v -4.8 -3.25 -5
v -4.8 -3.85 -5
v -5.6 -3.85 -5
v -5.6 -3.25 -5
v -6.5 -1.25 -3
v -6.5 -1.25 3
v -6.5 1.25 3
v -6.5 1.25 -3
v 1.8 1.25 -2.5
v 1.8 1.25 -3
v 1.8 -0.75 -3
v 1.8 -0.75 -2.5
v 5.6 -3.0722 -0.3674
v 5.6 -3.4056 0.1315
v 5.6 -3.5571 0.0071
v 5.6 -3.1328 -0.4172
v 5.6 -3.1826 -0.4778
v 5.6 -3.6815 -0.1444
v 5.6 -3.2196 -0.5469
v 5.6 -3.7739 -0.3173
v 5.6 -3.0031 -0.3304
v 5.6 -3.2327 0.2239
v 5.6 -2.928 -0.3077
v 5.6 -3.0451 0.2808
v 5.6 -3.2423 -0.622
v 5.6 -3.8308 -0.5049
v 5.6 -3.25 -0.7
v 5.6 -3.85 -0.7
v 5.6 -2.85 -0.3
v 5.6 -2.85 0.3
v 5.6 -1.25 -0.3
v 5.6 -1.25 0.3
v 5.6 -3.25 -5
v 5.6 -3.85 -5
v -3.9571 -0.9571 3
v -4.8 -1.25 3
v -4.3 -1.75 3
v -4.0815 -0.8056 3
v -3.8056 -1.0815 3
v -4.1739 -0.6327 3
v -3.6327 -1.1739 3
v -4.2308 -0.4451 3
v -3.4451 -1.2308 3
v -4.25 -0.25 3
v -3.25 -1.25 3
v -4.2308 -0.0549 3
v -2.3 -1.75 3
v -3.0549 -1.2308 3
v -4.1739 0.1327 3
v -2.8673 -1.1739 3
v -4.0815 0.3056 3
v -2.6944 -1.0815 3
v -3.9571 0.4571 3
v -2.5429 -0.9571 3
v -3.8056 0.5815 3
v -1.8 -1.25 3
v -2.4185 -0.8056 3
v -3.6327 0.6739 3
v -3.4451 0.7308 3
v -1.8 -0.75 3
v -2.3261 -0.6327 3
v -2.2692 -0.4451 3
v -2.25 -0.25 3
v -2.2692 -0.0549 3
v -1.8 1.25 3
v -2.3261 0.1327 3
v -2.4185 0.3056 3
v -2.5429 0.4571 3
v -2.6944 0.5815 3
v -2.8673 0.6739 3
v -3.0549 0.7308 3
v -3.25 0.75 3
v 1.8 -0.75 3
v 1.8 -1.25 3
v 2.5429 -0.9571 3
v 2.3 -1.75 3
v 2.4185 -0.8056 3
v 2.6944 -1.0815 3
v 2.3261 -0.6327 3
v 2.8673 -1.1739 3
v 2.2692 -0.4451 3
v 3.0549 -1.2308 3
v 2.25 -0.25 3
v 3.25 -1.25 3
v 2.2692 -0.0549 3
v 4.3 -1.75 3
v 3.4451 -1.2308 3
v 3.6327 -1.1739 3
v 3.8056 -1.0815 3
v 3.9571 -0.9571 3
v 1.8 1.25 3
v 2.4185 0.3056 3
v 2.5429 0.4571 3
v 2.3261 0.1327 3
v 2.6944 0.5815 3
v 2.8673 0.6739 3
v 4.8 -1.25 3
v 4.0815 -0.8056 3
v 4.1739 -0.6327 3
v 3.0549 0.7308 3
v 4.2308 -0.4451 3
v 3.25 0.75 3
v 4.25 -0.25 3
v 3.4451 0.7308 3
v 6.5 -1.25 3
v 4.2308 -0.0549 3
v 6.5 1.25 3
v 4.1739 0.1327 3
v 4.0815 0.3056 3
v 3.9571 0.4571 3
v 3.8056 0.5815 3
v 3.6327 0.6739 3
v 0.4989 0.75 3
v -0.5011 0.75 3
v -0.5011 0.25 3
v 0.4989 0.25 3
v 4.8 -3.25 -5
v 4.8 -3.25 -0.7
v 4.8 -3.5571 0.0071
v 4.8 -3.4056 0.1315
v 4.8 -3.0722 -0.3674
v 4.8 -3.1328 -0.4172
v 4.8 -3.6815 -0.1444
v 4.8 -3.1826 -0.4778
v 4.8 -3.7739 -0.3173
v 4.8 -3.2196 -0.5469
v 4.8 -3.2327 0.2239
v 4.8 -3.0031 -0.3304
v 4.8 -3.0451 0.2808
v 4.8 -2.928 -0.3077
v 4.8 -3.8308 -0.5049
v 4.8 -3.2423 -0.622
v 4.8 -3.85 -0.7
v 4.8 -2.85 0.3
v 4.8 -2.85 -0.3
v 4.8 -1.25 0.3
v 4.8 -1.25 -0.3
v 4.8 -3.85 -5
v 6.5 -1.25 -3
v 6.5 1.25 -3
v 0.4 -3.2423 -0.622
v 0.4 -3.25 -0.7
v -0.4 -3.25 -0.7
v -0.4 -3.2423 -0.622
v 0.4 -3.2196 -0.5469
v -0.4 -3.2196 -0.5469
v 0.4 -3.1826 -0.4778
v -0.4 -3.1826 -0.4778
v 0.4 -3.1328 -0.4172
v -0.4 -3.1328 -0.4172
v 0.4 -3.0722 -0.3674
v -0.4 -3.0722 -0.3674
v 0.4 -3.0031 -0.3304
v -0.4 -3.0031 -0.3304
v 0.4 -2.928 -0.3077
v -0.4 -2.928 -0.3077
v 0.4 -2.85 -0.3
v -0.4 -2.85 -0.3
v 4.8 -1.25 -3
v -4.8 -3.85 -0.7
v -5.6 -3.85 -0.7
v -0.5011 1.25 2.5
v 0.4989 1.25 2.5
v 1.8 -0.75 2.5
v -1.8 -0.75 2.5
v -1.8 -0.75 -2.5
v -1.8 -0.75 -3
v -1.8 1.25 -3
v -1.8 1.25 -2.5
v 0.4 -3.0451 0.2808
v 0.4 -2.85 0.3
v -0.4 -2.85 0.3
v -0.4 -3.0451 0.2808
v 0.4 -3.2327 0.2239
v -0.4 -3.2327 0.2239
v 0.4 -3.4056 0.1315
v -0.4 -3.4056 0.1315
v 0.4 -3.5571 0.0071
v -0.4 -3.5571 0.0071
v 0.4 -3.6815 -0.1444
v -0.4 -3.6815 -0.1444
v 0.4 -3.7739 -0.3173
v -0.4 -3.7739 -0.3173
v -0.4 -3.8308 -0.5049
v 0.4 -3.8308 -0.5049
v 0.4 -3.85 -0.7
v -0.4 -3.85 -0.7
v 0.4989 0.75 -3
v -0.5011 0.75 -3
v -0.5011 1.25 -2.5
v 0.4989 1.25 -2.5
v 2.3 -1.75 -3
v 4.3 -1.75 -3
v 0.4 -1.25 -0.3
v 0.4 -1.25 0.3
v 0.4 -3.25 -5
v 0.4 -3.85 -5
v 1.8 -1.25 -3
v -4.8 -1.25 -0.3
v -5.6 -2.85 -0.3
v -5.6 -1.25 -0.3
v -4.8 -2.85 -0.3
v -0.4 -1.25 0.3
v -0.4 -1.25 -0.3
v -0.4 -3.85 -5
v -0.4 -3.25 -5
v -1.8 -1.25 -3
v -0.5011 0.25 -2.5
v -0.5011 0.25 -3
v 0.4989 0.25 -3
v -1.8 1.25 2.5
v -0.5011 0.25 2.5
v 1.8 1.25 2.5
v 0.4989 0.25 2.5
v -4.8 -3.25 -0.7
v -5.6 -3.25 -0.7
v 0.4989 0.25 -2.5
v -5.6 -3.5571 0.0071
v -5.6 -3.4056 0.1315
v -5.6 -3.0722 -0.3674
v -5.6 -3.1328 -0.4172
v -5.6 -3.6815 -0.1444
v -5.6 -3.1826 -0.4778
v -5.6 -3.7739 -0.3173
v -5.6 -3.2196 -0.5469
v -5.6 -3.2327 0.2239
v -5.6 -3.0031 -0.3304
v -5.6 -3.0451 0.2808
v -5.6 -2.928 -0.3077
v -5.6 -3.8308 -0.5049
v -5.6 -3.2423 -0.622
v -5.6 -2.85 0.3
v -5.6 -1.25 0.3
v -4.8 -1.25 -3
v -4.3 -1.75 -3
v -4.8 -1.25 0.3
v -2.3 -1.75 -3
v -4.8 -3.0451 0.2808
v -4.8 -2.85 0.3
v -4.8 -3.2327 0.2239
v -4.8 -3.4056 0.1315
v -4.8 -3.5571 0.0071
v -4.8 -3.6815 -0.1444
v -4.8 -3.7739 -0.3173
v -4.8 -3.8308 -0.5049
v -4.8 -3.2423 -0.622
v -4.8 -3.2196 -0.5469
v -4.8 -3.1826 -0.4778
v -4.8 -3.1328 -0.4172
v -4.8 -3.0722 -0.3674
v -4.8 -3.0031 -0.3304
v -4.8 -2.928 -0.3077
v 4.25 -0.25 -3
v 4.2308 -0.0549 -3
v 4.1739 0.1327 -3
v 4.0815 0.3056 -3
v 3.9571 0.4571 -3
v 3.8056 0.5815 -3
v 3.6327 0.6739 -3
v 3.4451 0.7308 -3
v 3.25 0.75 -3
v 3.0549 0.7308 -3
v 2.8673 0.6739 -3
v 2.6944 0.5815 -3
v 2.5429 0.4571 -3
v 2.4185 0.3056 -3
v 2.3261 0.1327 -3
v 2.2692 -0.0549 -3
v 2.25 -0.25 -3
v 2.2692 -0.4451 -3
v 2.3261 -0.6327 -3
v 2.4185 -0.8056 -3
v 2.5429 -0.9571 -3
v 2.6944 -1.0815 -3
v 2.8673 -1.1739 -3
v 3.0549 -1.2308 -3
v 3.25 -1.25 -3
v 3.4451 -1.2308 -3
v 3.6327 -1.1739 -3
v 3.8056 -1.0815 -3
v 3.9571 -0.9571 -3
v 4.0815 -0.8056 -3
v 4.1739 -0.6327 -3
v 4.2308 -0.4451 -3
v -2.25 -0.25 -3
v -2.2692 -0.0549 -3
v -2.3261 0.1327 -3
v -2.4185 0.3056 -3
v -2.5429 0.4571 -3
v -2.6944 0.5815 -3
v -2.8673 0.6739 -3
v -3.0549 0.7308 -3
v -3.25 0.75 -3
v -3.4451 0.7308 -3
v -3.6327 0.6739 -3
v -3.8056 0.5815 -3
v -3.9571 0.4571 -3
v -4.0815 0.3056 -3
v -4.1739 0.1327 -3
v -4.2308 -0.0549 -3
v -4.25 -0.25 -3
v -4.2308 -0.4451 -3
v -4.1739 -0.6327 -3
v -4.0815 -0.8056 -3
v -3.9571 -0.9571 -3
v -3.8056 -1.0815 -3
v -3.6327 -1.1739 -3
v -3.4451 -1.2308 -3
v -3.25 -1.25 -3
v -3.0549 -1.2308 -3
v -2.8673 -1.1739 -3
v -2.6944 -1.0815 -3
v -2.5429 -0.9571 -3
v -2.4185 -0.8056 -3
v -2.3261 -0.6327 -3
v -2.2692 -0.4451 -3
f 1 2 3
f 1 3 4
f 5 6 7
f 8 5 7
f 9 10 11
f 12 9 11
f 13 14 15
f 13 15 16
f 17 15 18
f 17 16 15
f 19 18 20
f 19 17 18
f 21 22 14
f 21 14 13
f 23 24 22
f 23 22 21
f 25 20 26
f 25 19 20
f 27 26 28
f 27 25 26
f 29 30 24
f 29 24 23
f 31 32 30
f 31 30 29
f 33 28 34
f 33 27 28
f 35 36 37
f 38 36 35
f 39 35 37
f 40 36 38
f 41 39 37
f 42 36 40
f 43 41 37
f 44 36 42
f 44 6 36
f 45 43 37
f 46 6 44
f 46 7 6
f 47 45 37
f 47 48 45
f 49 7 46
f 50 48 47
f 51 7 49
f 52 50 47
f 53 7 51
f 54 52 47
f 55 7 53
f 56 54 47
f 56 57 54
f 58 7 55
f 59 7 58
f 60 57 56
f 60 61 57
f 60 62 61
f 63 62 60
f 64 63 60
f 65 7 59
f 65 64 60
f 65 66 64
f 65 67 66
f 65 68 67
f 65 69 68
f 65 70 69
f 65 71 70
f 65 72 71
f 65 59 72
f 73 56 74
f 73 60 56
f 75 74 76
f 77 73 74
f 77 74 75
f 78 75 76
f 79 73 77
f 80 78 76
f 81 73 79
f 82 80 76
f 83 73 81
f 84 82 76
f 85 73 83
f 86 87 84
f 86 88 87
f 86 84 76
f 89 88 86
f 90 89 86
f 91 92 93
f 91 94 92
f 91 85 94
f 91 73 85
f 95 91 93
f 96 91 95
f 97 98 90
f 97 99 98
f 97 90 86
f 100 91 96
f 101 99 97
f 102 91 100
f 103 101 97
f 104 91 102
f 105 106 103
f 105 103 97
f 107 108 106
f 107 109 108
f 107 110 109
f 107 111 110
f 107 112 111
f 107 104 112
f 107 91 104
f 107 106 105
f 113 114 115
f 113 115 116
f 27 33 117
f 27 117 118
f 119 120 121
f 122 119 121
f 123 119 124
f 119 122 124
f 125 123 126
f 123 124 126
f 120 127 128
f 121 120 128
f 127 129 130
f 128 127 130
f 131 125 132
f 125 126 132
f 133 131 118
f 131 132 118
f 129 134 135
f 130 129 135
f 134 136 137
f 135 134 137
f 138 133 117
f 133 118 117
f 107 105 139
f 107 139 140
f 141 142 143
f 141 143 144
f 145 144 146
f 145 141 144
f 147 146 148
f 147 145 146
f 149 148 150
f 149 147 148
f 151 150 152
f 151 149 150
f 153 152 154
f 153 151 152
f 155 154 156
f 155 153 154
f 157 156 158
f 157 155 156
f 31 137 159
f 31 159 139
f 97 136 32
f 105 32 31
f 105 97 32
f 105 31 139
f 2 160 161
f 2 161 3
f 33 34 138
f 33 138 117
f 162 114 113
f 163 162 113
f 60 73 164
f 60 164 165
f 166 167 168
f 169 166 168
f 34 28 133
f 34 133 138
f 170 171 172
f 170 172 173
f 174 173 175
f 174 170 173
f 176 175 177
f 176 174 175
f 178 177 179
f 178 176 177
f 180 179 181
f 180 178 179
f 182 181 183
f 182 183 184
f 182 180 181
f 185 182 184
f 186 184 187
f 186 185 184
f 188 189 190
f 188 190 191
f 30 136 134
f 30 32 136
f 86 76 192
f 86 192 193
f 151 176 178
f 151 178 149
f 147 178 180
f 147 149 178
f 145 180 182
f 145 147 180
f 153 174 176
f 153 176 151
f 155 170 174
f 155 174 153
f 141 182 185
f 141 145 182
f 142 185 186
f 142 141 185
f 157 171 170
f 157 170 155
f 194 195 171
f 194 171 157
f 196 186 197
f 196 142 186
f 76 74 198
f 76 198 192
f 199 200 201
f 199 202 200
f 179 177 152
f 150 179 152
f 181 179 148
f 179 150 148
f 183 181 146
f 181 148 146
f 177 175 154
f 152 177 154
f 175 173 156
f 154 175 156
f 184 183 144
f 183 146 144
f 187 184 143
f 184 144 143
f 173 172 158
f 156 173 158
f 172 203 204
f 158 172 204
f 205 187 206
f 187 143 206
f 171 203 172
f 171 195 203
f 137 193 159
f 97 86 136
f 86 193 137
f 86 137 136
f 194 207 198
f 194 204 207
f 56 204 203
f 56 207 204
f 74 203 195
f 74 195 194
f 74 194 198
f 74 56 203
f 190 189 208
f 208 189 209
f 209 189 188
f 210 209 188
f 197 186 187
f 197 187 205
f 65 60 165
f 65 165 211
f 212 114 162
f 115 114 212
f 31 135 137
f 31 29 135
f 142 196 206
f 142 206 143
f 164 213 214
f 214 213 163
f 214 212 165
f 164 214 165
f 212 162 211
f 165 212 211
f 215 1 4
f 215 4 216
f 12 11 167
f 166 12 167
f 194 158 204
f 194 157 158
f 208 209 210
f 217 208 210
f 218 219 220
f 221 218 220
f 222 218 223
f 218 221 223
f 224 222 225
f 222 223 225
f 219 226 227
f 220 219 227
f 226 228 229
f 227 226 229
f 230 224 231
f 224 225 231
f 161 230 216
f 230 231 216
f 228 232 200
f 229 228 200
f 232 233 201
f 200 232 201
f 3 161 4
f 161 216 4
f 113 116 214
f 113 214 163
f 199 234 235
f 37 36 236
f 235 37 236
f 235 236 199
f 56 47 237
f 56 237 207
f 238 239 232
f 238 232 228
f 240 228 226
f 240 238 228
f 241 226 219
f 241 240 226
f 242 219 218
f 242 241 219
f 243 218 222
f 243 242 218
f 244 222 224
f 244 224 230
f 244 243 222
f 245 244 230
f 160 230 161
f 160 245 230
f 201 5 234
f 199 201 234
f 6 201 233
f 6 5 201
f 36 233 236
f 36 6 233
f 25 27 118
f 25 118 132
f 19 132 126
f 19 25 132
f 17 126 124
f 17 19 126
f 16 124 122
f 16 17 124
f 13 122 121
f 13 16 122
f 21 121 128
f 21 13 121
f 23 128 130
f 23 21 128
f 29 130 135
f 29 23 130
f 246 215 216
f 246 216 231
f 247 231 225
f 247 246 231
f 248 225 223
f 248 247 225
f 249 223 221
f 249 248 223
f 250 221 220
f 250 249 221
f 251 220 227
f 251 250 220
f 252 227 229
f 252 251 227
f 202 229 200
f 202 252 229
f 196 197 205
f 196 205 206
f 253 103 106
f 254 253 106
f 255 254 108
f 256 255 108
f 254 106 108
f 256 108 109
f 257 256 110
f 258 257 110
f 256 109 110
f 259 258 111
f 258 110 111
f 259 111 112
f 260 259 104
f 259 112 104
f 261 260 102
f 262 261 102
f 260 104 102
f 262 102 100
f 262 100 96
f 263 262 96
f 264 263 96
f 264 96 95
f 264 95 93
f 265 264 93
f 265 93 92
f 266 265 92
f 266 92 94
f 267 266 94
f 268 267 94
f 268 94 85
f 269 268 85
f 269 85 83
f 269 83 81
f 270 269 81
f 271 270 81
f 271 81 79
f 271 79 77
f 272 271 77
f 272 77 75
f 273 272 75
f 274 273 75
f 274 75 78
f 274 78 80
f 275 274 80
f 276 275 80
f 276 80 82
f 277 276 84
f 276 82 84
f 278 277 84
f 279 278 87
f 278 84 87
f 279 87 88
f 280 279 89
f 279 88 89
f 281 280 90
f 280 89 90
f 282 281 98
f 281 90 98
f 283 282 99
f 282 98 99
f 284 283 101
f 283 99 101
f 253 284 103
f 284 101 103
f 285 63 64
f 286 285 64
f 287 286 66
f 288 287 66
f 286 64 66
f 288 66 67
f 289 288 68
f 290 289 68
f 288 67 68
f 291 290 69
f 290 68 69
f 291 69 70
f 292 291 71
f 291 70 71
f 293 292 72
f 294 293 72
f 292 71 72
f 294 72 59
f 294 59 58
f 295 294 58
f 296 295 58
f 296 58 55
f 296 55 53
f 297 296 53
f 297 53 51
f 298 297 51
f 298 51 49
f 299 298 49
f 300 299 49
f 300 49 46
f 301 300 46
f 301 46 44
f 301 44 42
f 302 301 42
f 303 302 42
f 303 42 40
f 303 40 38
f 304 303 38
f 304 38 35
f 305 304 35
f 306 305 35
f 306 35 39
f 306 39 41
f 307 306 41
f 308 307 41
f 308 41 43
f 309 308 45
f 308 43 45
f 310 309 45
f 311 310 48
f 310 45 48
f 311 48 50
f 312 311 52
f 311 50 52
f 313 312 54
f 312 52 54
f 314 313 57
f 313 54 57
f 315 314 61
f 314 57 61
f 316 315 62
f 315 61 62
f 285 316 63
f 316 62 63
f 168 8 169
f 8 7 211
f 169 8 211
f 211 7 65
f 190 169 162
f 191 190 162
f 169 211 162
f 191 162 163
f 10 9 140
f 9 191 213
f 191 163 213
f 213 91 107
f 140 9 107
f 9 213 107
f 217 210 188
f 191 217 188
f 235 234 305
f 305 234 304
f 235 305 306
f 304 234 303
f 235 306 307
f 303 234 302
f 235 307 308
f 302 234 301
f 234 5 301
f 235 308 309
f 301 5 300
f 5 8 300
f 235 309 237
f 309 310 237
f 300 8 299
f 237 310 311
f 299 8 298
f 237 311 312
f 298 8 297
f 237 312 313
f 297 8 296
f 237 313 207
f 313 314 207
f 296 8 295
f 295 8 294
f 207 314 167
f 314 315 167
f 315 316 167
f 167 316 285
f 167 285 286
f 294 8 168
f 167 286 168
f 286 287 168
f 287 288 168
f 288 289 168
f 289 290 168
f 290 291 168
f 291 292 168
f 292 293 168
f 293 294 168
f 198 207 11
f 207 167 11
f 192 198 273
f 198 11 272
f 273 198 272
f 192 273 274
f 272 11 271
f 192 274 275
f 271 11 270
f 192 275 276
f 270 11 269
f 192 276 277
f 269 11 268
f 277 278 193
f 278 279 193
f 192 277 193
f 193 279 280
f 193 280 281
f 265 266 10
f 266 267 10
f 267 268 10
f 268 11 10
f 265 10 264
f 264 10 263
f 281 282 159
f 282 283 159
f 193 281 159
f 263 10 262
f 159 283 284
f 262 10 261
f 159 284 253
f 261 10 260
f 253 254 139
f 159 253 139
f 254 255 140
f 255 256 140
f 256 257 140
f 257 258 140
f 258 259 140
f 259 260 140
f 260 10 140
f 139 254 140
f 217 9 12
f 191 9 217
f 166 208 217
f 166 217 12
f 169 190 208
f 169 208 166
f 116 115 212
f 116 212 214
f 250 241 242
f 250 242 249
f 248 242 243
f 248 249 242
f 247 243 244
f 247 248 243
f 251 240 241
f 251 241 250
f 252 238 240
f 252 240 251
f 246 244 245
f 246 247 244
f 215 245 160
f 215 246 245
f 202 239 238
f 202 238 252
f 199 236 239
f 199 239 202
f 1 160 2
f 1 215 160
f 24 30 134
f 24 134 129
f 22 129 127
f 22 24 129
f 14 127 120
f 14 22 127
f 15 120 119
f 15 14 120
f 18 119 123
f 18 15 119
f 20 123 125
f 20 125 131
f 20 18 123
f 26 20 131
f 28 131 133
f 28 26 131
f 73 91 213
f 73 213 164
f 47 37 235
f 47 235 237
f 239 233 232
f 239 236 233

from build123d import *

# Parameters (mm, degrees)
SCHIZZO1_W                   = 13
SCHIZZO1_H                   = 2.5
ESTRUSIONE_ESTRUSIONE1_DEPTH = 3
ESTRUSIONE_ESTRUSIONE2_DEPTH = 6
SCHIZZO3_R                   = 1
TAGLIO_ESTRUSIONE1_DEPTH     = 7
TAGLIO_ESTRUSIONE2_DEPTH     = 0.5
SMUSSO1_SIZE                 = 0.5
ESTRUSIONE_ESTRUSIONE3_DEPTH = 0.4
RIPETIZIONE_A_L1_COUNT       = 2
RIPETIZIONE_A_L1_PITCH       = 5.2
RIPETIZIONE_A_L1_COL_COUNT   = 2
RIPETIZIONE_A_L1_COL_PITCH   = 5.2


with BuildPart() as part:
    # Schizzo1 → Estrusione-Estrusione1 (new body, symmetric)
    with BuildSketch(Plane.XY):
        Rectangle(SCHIZZO1_W, SCHIZZO1_H)
    extrude(amount=ESTRUSIONE_ESTRUSIONE1_DEPTH, both=True)

    # Schizzo2 → Estrusione-Estrusione2 (add)
    with BuildSketch(Plane.XY.offset(3)):
        Polygon((-4.8, -1.25), (-4.3, -1.75), (-2.3, -1.75), (-1.8, -1.25), (1.8, -1.25), (2.3, -1.75), (4.3, -1.75), (4.8, -1.25), (4.8, -0.938044121), (-4.8, -0.938044121), align=None)
    extrude(amount=-ESTRUSIONE_ESTRUSIONE2_DEPTH)

    # Schizzo3 → Taglio-Estrusione1 (cut, through all)
    with BuildSketch(Plane.XY.offset(3)):
        with Locations((-3.25, -0.25)):
            Circle(SCHIZZO3_R)
        with Locations((3.25, -0.25)):
            Circle(SCHIZZO3_R)
    extrude(amount=-TAGLIO_ESTRUSIONE1_DEPTH, mode=Mode.SUBTRACT)

    # Schizzo4 → Taglio-Estrusione2 (cut)
    with BuildSketch(Plane.XY.offset(3)):
        Polygon((-1.8, 1.25), (-0.501117074, 1.25), (-0.501117074, 0.25), (0.498882926, 0.25), (0.498882926, 1.25), (1.8, 1.25), (1.8, -0.75), (-1.8, -0.75), align=None)
    taglio_estrusione2 = extrude(amount=-TAGLIO_ESTRUSIONE2_DEPTH, mode=Mode.SUBTRACT)

    # Specchia2: Taglio-Estrusione2 across plane
    add(taglio_estrusione2.mirror(Plane.XY), mode=Mode.SUBTRACT)

    # Smusso1
    smusso1_edges = [part.edges().sort_by_distance(p)[0] for p in [
        (-0.001117074, 1.25, 3),
        (-0.001117074, 1.25, -3),
    ]]
    chamfer(smusso1_edges, length=SMUSSO1_SIZE)

    # Schizzo5 → Estrusione-Estrusione3 (add, symmetric)
    with BuildSketch(Plane(origin=(0, 0, 0), x_dir=(0, 0, -1), z_dir=(1, 0, 0))):
        with BuildLine():
            Line((-0.3, -1.25), (-0.3, -2.85))
            ThreePointArc((-0.3, -2.85), (-0.007106781, -3.557106781), (0.7, -3.85))
            Line((0.7, -3.85), (5, -3.85))
            Line((5, -3.85), (5, -3.25))
            Line((5, -3.25), (0.7, -3.25))
            ThreePointArc((0.7, -3.25), (0.417157288, -3.132842712), (0.3, -2.85))
            Line((0.3, -2.85), (0.3, -1.25))
            Line((0.3, -1.25), (-0.3, -1.25))
        make_face()
    estrusione_estrusione3 = extrude(amount=ESTRUSIONE_ESTRUSIONE3_DEPTH, both=True)

    # Ripetizione a L1: Estrusione-Estrusione3 ×2
    with Locations(*[(-i * RIPETIZIONE_A_L1_PITCH, 0, 0) for i in range(1, RIPETIZIONE_A_L1_COUNT)]):
        add(estrusione_estrusione3)

    # Ripetizione a L1 col: Estrusione-Estrusione3 ×2
    with Locations(*[(i * RIPETIZIONE_A_L1_COL_PITCH, 0, 0) for i in range(1, RIPETIZIONE_A_L1_COL_COUNT)]):
        add(estrusione_estrusione3)


solid = part.part
